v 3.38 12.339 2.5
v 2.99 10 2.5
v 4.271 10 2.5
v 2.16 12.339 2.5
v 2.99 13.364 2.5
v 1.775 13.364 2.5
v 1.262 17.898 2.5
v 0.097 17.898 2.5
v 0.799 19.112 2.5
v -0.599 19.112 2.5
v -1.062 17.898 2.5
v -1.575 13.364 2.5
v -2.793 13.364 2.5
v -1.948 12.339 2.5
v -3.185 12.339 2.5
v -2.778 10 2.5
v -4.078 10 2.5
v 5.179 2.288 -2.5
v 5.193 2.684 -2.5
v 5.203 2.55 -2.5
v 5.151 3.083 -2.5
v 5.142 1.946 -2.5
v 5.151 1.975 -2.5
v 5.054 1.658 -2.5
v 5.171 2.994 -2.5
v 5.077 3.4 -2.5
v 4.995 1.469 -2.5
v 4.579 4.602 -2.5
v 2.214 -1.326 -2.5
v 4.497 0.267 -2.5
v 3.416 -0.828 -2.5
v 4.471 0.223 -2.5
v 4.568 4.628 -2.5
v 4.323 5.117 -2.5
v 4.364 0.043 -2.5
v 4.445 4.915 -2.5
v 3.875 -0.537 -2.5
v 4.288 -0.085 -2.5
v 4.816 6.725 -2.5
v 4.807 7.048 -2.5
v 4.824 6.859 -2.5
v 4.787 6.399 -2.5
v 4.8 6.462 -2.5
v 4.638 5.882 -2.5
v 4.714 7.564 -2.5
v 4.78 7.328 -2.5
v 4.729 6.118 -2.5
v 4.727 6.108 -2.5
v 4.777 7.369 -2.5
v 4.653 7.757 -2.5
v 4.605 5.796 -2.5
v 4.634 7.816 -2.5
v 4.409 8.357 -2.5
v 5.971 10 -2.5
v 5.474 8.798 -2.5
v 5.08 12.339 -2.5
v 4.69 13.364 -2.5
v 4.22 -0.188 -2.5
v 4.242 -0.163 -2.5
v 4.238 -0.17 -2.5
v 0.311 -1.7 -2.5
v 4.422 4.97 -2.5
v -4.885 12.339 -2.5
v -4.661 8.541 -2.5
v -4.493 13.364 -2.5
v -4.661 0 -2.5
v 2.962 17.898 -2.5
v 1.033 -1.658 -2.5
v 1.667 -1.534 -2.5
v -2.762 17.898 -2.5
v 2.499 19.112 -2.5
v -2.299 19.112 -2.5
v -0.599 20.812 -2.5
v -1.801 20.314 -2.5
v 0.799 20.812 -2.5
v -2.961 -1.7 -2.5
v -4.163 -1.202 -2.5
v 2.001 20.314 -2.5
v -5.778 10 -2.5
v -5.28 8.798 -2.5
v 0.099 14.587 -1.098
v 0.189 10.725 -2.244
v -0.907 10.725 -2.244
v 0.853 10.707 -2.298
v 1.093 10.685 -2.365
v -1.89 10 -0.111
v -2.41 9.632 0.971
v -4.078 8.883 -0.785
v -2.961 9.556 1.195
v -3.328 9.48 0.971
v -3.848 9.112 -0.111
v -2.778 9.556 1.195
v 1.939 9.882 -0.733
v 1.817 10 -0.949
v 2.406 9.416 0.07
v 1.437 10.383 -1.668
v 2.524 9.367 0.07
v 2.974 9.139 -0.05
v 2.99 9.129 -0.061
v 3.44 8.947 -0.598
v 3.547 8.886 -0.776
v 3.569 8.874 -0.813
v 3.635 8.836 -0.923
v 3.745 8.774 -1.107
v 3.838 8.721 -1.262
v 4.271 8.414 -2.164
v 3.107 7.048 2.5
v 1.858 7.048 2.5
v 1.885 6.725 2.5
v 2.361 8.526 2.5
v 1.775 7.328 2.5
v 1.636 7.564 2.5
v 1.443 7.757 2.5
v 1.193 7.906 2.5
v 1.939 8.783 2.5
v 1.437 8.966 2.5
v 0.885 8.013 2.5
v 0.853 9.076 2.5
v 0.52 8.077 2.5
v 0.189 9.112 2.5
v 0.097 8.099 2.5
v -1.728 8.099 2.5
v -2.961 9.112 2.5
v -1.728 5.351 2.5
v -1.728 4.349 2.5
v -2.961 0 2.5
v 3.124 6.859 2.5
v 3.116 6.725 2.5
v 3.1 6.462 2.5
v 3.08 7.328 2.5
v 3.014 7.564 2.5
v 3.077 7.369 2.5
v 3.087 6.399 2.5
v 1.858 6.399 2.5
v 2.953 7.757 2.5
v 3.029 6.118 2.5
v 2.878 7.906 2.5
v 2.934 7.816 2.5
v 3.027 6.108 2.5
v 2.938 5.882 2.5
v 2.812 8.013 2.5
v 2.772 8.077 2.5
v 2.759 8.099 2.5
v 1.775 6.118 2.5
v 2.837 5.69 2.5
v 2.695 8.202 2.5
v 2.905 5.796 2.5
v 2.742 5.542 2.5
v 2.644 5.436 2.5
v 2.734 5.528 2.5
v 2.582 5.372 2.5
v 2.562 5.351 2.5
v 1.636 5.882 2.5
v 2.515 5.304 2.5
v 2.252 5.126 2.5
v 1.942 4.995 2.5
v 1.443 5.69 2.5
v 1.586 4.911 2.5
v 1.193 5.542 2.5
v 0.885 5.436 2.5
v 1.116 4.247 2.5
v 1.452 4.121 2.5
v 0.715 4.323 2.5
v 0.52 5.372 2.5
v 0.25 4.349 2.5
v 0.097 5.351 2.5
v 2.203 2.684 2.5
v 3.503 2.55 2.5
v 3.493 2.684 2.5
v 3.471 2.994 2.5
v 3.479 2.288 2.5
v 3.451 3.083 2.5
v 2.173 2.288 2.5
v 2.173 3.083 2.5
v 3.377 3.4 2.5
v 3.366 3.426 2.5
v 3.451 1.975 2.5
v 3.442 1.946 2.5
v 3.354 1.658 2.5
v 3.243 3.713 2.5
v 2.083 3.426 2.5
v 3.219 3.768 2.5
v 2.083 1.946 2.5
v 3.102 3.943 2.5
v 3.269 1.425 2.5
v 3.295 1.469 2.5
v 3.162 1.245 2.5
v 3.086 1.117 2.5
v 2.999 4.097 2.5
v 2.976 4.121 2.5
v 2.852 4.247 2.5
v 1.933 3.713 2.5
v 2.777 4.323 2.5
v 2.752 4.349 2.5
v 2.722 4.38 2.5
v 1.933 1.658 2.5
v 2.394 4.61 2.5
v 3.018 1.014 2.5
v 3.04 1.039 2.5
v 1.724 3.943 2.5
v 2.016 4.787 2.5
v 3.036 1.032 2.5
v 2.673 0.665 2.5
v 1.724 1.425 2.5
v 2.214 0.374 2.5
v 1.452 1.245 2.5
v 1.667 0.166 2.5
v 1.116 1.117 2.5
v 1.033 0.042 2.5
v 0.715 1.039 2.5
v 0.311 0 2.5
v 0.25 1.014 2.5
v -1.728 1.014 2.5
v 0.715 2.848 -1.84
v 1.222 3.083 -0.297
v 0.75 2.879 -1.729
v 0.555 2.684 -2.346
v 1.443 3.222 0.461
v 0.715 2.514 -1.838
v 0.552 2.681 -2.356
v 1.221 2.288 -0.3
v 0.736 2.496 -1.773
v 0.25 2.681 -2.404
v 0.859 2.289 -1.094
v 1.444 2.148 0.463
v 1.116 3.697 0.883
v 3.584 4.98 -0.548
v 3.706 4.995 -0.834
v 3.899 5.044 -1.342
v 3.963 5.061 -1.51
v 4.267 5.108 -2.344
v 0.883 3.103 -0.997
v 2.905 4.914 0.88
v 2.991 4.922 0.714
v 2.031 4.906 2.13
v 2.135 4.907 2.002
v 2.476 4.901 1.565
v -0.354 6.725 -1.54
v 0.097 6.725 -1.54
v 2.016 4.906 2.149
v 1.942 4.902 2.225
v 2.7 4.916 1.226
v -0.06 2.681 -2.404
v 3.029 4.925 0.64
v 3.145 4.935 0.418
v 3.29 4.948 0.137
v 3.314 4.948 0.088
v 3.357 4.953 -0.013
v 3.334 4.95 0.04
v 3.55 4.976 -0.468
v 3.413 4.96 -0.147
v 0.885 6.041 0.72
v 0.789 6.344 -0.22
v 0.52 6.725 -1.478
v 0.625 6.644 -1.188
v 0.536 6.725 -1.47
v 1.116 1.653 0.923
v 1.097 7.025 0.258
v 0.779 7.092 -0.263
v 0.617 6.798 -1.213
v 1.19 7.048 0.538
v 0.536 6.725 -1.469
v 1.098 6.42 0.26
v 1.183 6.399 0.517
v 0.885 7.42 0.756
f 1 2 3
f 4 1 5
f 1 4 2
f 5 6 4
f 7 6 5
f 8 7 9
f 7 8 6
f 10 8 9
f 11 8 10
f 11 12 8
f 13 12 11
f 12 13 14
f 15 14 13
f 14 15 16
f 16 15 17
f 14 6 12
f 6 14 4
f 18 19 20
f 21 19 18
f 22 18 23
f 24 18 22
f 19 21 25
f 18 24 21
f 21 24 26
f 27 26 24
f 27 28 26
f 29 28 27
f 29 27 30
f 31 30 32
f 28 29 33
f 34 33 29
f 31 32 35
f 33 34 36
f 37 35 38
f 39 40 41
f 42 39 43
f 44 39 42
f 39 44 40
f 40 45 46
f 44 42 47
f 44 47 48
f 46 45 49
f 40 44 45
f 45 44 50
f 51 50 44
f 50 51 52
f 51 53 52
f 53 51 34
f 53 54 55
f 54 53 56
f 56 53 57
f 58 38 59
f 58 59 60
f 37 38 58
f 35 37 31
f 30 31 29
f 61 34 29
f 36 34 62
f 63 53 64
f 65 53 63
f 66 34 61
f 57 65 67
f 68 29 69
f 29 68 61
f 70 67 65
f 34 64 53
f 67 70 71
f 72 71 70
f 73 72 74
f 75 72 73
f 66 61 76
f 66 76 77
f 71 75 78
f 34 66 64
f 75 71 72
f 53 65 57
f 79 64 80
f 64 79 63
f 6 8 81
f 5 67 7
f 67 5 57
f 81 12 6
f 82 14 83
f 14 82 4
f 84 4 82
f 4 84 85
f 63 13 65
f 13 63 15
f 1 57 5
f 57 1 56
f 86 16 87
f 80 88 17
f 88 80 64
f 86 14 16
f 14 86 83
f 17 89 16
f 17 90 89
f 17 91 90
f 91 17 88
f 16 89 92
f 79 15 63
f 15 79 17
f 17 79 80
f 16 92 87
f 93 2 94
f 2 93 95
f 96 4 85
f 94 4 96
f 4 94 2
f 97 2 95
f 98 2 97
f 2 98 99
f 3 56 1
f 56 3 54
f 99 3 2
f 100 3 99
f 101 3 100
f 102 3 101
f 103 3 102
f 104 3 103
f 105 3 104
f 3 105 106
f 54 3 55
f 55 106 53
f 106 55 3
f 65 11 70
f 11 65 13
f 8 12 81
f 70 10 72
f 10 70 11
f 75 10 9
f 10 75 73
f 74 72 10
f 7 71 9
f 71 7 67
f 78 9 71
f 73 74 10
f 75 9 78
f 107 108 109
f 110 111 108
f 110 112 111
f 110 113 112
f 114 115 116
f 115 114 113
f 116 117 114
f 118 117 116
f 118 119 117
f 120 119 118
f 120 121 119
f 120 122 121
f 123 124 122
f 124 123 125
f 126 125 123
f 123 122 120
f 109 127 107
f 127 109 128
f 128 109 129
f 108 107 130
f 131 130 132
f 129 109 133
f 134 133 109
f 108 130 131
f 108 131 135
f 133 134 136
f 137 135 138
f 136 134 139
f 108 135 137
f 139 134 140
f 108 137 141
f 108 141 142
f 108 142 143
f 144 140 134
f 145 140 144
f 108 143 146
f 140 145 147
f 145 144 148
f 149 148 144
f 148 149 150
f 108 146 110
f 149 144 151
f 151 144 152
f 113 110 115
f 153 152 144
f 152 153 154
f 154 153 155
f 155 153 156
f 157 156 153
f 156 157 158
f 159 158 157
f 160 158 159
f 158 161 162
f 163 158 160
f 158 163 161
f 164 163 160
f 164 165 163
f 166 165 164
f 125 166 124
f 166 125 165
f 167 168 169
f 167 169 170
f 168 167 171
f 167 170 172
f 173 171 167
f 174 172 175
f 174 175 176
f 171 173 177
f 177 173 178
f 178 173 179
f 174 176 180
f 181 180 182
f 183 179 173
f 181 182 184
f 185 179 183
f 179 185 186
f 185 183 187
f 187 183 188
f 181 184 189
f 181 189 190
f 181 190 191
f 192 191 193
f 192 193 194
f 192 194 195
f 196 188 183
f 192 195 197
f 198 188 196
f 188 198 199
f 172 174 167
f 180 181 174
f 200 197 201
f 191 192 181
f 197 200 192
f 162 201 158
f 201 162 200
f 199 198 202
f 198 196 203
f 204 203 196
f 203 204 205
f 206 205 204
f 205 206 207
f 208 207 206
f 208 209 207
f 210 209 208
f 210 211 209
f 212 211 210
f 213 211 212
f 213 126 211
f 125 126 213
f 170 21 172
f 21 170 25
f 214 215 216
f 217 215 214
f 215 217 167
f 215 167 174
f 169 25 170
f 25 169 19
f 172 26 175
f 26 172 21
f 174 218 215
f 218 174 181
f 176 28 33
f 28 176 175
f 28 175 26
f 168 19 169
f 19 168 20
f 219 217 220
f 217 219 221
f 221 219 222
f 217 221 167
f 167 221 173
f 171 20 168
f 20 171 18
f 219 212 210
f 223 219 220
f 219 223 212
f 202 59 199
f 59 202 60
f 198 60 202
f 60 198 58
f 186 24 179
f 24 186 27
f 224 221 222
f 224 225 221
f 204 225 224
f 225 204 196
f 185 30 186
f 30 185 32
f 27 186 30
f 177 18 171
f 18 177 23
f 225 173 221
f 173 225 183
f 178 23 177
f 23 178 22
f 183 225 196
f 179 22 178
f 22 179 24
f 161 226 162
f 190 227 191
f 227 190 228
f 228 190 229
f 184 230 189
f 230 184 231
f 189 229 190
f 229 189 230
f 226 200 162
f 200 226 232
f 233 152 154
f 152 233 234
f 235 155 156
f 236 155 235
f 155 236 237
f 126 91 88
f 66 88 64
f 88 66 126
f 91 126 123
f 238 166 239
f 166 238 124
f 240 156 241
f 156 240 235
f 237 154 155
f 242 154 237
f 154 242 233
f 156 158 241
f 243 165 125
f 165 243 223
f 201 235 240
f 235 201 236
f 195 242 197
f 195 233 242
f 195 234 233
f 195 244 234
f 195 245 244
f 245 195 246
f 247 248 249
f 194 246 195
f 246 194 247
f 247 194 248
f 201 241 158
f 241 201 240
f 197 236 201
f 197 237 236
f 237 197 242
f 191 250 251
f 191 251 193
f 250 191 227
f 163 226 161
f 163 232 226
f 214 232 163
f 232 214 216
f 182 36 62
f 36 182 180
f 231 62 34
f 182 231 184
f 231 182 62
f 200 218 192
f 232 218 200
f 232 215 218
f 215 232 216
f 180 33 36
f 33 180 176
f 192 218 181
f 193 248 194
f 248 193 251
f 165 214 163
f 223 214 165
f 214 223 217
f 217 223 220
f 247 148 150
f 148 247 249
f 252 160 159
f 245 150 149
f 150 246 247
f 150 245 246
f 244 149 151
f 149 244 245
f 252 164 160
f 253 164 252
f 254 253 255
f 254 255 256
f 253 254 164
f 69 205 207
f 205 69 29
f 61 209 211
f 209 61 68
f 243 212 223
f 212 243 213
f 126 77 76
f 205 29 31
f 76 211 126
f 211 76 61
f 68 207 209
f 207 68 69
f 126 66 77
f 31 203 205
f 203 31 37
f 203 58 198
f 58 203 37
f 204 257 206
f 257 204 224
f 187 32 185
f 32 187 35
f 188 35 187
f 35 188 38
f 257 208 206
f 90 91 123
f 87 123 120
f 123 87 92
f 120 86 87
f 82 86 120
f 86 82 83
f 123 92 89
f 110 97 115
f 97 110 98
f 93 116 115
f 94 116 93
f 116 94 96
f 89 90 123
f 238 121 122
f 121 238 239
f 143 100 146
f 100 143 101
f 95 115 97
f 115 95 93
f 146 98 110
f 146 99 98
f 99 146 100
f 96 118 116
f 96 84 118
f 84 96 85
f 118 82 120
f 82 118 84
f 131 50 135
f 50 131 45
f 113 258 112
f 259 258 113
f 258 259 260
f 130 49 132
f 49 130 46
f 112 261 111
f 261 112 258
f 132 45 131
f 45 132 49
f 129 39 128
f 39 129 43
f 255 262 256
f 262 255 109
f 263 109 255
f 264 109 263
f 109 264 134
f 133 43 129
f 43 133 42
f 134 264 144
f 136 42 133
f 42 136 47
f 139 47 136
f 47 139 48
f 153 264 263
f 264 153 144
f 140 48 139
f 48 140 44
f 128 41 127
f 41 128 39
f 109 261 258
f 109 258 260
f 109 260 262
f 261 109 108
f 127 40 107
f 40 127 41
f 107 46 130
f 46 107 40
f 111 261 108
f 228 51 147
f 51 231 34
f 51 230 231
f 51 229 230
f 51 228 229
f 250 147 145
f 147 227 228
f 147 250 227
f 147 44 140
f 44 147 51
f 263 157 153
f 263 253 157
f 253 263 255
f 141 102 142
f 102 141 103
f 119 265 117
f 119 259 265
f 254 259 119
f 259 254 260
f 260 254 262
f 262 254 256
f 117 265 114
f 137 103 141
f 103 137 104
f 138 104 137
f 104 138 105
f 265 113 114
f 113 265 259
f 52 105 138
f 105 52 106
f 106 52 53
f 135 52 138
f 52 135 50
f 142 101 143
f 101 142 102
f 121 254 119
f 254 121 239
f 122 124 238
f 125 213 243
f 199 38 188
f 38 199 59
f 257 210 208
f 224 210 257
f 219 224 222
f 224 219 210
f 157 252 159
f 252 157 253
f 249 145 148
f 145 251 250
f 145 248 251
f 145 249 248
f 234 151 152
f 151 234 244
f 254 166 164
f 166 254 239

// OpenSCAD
//Set the 1st textline to render
textstring1="A";

//Set the 2nd textline to render - or leave blank if only 1 line is needed
textstring2="B";

//Font name. In the list is first a selection of bold fonts. After the dashed line you get a list of thinner fonts, which are not really recommended.
fontname="Nova Mono"; //[Vivian,Holtwood One SC,Alegreya Sans SC Black,Alfa Slab One,Asset,Black Ops One,Bowlby One,Bowlby One SC,Chango,Cinzel Decorative Black,Coustard,Elsie Black,Elsie Swash Caps Black,Erica One,Exo2 Black,Fascinate,Lobster,PassionOne,Plaster,Poller One,Rammetto One,Ruslan Display,Sarpanch Black,Sigmar One,Sonsie One,Titan One,Ultra,Hanalei,---------,ABeeZee,Abel,Abril Fatface,Aclonica,Acme,Actor,Adamina,Advent Pro,Aguafina Script,Akronim,Aladin,Aldrich,Alef,Alex Brush,Alice,Alike,Alike Angular,Allan,Allerta,Allerta Stencil,Allura,Almendra,Almendra Display,Almendra SC,Amarante,Amaranth,Amatic SC,Amethysta,Amiri,Anaheim,Andada,Andika,Angkor,Annie Use Your Telescope,Anonymous Pro,Antic,Antic Didone,Antic Slab,Anton,Arapey,Arbutus,Arbutus Slab,Architects Daughter,Archivo Black,Archivo Narrow,Arimo,Arizonia,Armata,Artifika,Arvo,Asap,Asset,Astloch,Asul,Atomic Age,Aubrey,Audiowide,Autour One,Average,Average Sans,Averia Gruesa Libre,Averia Libre,Averia Sans Libre,Averia Serif Libre,Bad Script,Balthazar,Bangers,Basic,Battambang,Baumans,Bayon,Belgrano,Belleza,BenchNine,Bentham,Berkshire Swash,Bevan,Bigelow Rules,Bigshot One,Bilbo,Bilbo Swash Caps,Bitter,Black Ops One,Bokor,Bonbon,Boogaloo,Bowlby One,Bowlby One SC,Brawler,Bree Serif,Bubblegum Sans,Bubbler One,Buda,Buenard,Butcherman,Butterfly Kids,Cabin,Cabin Condensed,Cabin Sketch,Caesar Dressing,Cagliostro,Calligraffitti,Cambay,Cambo,Candal,Cantarell,Cantata One,Cantora One,Capriola,Cardo,Carme,Carrois Gothic,Carrois Gothic SC,Carter One,Caudex,Cedarville Cursive,Ceviche One,Changa One,Chango,Chau Philomene One,Chela One,Chelsea Market,Chenla,Cherry Cream Soda,Cherry Swash,Chewy,Chicle,Chivo,Cinzel,Cinzel Decorative,Clicker Script,Coda,Coda Caption,Codystar,Combo,Comfortaa,Coming Soon,Concert One,Condiment,Content,Contrail One,Convergence,Cookie,Copse,Corben,Courgette,Cousine,Coustard,Covered By Your Grace,Crafty Girls,Creepster,Crete Round,Crimson Text,Croissant One,Crushed,Cuprum,Cutive,Cutive Mono,Damion,Dancing Script,Dangrek,Dawning of a New Day,Days One,Dekko,Delius,Delius Swash Caps,Delius Unicase,Della Respira,Denk One,Devonshire,Dhurjati,Didact Gothic,Diplomata,Diplomata SC,Domine,Donegal One,Doppio One,Dorsa,Dosis,Dr Sugiyama,Droid Sans,Droid Sans Mono,Droid Serif,Duru Sans,Dynalight,Eagle Lake,Eater,EB Garamond,Economica,Ek Mukta,Electrolize,Elsie,Elsie Swash Caps,Emblema One,Emilys Candy,Engagement,Englebert,Enriqueta,Erica One,Esteban,Euphoria Script,Ewert,Exo,Exo 2,Expletus Sans,Fanwood Text,Fascinate,Fascinate Inline,Faster One,Fasthand,Fauna One,Federant,Federo,Felipa,Fenix,Finger Paint,Fira Mono,Fira Sans,Fjalla One,Fjord One,Flamenco,Flavors,Fondamento,Fontdiner Swanky,Forum,Francois One,Freckle Face,Fredericka the Great,Fredoka One,Freehand,Fresca,Frijole,Fruktur,Fugaz One,Gabriela,Gafata,Galdeano,Galindo,Gentium Basic,Gentium Book Basic,Geo,Geostar,Geostar Fill,Germania One,GFS Didot,GFS Neohellenic,Gidugu,Gilda Display,Give You Glory,Glass Antiqua,Glegoo,Gloria Hallelujah,Goblin One,Gochi Hand,Gorditas,Goudy Bookletter 1911,Graduate,Grand Hotel,Gravitas One,Great Vibes,Griffy,Gruppo,Gudea,Gurajada,Habibi,Halant,Hammersmith One,Hanalei,Hanalei Fill,Handlee,Hanuman,Happy Monkey,Headland One,Henny Penny,Herr Von Muellerhoff,Hind,Homemade Apple,Homenaje,Iceberg,Iceland,IM Fell Double Pica,IM Fell Double Pica SC,IM Fell DW Pica,IM Fell DW Pica SC,IM Fell English,IM Fell English SC,IM Fell French Canon,IM Fell French Canon SC,IM Fell Great Primer,IM Fell Great Primer SC,Imprima,Inconsolata,Inder,Indie Flower,Inika,Irish Grover,Istok Web,Italiana,Italianno,Jacques Francois,Jacques Francois Shadow,Jim Nightshade,Jockey One,Jolly Lodger,Josefin Sans,Josefin Slab,Joti One,Judson,Julee,Julius Sans One,Junge,Jura,Just Another Hand,Just Me Again Down Here,Kalam,Kameron,Kantumruy,Karla,Karma,Kaushan Script,Kavoon,Kdam Thmor,Keania One,Kelly Slab,Kenia,Khand,Khmer,Khula,Kite One,Knewave,Kotta One,Koulen,Kranky,Kreon,Kristi,Krona One,La Belle Aurore,Laila,Lakki Reddy,Lancelot,Lateef,Lato,League Script,Leckerli One,Ledger,Lekton,Lemon,Liberation Sans,Libre Baskerville,Life Savers,Lilita One,Lily Script One,Limelight,Linden Hill,Lobster,Lobster Two,Londrina Outline,Londrina Shadow,Londrina Sketch,Londrina Solid,Lora,Love Ya Like A Sister,Loved by the King,Lovers Quarrel,Luckiest Guy,Lusitana,Lustria,Macondo,Macondo Swash Caps,Magra,Maiden Orange,Mako,Mallanna,Mandali,Marcellus,Marcellus SC,Marck Script,Margarine,Marko One,Marmelad,Martel Sans,Marvel,Mate,Mate SC,Maven Pro,McLaren,Meddon,MedievalSharp,Medula One,Megrim,Meie Script,Merienda,Merienda One,Merriweather,Merriweather Sans,Metal,Metal Mania,Metamorphous,Metrophobic,Michroma,Milonga,Miltonian,Miltonian Tattoo,Miniver,Miss Fajardose,Modak,Modern Antiqua,Molengo,Molle,Monda,Monofett,Monoton,Monsieur La Doulaise,Montaga,Montez,Montserrat,Montserrat Alternates,Montserrat Subrayada,Moul,Moulpali,Mountains of Christmas,Mouse Memoirs,Mr Bedfort,Mr Dafoe,Mr De Haviland,Mrs Saint Delafield,Mrs Sheppards,Muli,Mystery Quest,Neucha,Neuton,New Rocker,News Cycle,Niconne,Nixie One,Nobile,Nokora,Norican,Nosifer,Nothing You Could Do,Noticia Text,Noto Sans,Noto Serif,Nova Cut,Nova Flat,Nova Mono,Nova Oval,Nova Round,Nova Script,Nova Slim,Nova Square,NTR,Numans,Nunito,Odor Mean Chey,Offside,Old Standard TT,Oldenburg,Oleo Script,Oleo Script Swash Caps,Open Sans,Open Sans Condensed,Oranienbaum,Orbitron,Oregano,Orienta,Original Surfer,Oswald,Over the Rainbow,Overlock,Overlock SC,Ovo,Oxygen,Oxygen Mono,Pacifico,Paprika,Parisienne,Passero One,Passion One,Pathway Gothic One,Patrick Hand,Patrick Hand SC,Patua One,Paytone One,Peddana,Peralta,Permanent Marker,Petit Formal Script,Petrona,Philosopher,Piedra,Pinyon Script,Pirata One,Plaster,Play,Playball,Playfair Display,Playfair Display SC,Podkova,Poiret One,Poller One,Poly,Pompiere,Pontano Sans,Port Lligat Sans,Port Lligat Slab,Prata,Preahvihear,Press Start 2P,Princess Sofia,Prociono,Prosto One,PT Mono,PT Sans,PT Sans Caption,PT Sans Narrow,PT Serif,PT Serif Caption,Puritan,Purple Purse,Quando,Quantico,Quattrocento,Quattrocento Sans,Questrial,Quicksand,Quintessential,Qwigley,Racing Sans One,Radley,Rajdhani,Raleway,Raleway Dots,Ramabhadra,Ramaraja,Rambla,Rammetto One,Ranchers,Rancho,Ranga,Rationale,Ravi Prakash,Redressed,Reenie Beanie,Revalia,Ribeye,Ribeye Marrow,Righteous,Risque,Roboto,Roboto Condensed,Roboto Slab,Rochester,Rock Salt,Rokkitt,Romanesco,Ropa Sans,Rosario,Rosarivo,Rouge Script,Rozha One,Rubik Mono One,Rubik One,Ruda,Rufina,Ruge Boogie,Ruluko,Rum Raisin,Ruslan Display,Russo One,Ruthie,Rye,Sacramento,Sail,Salsa,Sanchez,Sancreek,Sansita One,Sarina,Sarpanch,Satisfy,Scada,Scheherazade,Schoolbell,Seaweed Script,Sevillana,Seymour One,Shadows Into Light,Shadows Into Light Two,Shanti,Share,Share Tech,Share Tech Mono,Shojumaru,Short Stack,Siemreap,Sigmar One,Signika,Signika Negative,Simonetta,Sintony,Sirin Stencil,Six Caps,Skranji,Slabo 13px,Slabo 27px,Slackey,Smokum,Smythe,Sniglet,Snippet,Snowburst One,Sofadi One,Sofia,Sonsie One,Sorts Mill Goudy,Source Code Pro,Source Sans Pro,Source Serif Pro,Special Elite,Spicy Rice,Spinnaker,Spirax,Squada One,Sree Krushnadevaraya,Stalemate,Stalinist One,Stardos Stencil,Stint Ultra Condensed,Stint Ultra Expanded,Stoke,Strait,Sue Ellen Francisco,Sunshiney,Supermercado One,Suranna,Suravaram,Suwannaphum,Swanky and Moo Moo,Syncopate,Tangerine,Taprom,Tauri,Teko,Telex,Tenali Ramakrishna,Tenor Sans,Text Me One,The Girl Next Door,Tienne,Timmana,Tinos,Titan One,Titillium Web,Trade Winds,Trocchi,Trochut,Trykker,Tulpen One,Ubuntu,Ubuntu Condensed,Ubuntu Mono,Ultra,Uncial Antiqua,Underdog,Unica One,UnifrakturCook,UnifrakturMaguntia,Unkempt,Unlock,Unna,Vampiro One,Varela,Varela Round,Vast Shadow,Vesper Libre,Vibur,Vidaloka,Viga,Voces,Volkhov,Vollkorn,Voltaire,VT323,Waiting for the Sunrise,Wallpoet,Walter Turncoat,Warnes,Wellfleet,Wendy One,Wire One,Yanone Kaffeesatz,Yellowtail,Yeseva One,Yesteryear,Zeyada]

//type
//type="tag"; //[container, tag, hollow]

//scaling up
scale=1.7;

//Text height (extrusion) in mm
textheight=5;

//Set font size in mm
textsize=10; 

//line height in font size measured
lineheight=1.0;

/* [Hidden] */
//-------------------------------------------------------------------------------


/*
Chamfered Text 2
Version 3, September 2018
Written by MC Geisler (mcgenki at gmail dot com)

A text for your customization...
Have fun!

License: Attribution 4.0 International (CC BY 4.0)

You are free to:
    Share - copy and redistribute the material in any medium or format
    Adapt - remix, transform, and build upon the material
    for any purpose, even commercially.
*/

    
module writetext(textstr, sizeit)
{
    text(textstr,size=sizeit*.9,font=fontname,halign="center",valign="baseline");
}

module RiseText(textstr1, textstr2, textsize,textheight, scale) 
{ 
    minkowski()
    {
        union()
        {
            if (textstr1!="")
                translate([0,textsize*lineheight,0])
                    linear_extrude(height=.0001,convexity = 32)
                        writetext(textstr1, textsize);
            
            if (textstr2!="")
                linear_extrude(height=.0001,convexity = 32)
                    writetext(textstr2, textsize);
        }
        
        //rotate([0,180,0])
            cylinder(h=textheight, r1=scale, r2=0, center=true, $fn=8);
    }
}

//rotate([90,0,0])
    RiseText(textstring1,textstring2,textsize,textheight, scale);
